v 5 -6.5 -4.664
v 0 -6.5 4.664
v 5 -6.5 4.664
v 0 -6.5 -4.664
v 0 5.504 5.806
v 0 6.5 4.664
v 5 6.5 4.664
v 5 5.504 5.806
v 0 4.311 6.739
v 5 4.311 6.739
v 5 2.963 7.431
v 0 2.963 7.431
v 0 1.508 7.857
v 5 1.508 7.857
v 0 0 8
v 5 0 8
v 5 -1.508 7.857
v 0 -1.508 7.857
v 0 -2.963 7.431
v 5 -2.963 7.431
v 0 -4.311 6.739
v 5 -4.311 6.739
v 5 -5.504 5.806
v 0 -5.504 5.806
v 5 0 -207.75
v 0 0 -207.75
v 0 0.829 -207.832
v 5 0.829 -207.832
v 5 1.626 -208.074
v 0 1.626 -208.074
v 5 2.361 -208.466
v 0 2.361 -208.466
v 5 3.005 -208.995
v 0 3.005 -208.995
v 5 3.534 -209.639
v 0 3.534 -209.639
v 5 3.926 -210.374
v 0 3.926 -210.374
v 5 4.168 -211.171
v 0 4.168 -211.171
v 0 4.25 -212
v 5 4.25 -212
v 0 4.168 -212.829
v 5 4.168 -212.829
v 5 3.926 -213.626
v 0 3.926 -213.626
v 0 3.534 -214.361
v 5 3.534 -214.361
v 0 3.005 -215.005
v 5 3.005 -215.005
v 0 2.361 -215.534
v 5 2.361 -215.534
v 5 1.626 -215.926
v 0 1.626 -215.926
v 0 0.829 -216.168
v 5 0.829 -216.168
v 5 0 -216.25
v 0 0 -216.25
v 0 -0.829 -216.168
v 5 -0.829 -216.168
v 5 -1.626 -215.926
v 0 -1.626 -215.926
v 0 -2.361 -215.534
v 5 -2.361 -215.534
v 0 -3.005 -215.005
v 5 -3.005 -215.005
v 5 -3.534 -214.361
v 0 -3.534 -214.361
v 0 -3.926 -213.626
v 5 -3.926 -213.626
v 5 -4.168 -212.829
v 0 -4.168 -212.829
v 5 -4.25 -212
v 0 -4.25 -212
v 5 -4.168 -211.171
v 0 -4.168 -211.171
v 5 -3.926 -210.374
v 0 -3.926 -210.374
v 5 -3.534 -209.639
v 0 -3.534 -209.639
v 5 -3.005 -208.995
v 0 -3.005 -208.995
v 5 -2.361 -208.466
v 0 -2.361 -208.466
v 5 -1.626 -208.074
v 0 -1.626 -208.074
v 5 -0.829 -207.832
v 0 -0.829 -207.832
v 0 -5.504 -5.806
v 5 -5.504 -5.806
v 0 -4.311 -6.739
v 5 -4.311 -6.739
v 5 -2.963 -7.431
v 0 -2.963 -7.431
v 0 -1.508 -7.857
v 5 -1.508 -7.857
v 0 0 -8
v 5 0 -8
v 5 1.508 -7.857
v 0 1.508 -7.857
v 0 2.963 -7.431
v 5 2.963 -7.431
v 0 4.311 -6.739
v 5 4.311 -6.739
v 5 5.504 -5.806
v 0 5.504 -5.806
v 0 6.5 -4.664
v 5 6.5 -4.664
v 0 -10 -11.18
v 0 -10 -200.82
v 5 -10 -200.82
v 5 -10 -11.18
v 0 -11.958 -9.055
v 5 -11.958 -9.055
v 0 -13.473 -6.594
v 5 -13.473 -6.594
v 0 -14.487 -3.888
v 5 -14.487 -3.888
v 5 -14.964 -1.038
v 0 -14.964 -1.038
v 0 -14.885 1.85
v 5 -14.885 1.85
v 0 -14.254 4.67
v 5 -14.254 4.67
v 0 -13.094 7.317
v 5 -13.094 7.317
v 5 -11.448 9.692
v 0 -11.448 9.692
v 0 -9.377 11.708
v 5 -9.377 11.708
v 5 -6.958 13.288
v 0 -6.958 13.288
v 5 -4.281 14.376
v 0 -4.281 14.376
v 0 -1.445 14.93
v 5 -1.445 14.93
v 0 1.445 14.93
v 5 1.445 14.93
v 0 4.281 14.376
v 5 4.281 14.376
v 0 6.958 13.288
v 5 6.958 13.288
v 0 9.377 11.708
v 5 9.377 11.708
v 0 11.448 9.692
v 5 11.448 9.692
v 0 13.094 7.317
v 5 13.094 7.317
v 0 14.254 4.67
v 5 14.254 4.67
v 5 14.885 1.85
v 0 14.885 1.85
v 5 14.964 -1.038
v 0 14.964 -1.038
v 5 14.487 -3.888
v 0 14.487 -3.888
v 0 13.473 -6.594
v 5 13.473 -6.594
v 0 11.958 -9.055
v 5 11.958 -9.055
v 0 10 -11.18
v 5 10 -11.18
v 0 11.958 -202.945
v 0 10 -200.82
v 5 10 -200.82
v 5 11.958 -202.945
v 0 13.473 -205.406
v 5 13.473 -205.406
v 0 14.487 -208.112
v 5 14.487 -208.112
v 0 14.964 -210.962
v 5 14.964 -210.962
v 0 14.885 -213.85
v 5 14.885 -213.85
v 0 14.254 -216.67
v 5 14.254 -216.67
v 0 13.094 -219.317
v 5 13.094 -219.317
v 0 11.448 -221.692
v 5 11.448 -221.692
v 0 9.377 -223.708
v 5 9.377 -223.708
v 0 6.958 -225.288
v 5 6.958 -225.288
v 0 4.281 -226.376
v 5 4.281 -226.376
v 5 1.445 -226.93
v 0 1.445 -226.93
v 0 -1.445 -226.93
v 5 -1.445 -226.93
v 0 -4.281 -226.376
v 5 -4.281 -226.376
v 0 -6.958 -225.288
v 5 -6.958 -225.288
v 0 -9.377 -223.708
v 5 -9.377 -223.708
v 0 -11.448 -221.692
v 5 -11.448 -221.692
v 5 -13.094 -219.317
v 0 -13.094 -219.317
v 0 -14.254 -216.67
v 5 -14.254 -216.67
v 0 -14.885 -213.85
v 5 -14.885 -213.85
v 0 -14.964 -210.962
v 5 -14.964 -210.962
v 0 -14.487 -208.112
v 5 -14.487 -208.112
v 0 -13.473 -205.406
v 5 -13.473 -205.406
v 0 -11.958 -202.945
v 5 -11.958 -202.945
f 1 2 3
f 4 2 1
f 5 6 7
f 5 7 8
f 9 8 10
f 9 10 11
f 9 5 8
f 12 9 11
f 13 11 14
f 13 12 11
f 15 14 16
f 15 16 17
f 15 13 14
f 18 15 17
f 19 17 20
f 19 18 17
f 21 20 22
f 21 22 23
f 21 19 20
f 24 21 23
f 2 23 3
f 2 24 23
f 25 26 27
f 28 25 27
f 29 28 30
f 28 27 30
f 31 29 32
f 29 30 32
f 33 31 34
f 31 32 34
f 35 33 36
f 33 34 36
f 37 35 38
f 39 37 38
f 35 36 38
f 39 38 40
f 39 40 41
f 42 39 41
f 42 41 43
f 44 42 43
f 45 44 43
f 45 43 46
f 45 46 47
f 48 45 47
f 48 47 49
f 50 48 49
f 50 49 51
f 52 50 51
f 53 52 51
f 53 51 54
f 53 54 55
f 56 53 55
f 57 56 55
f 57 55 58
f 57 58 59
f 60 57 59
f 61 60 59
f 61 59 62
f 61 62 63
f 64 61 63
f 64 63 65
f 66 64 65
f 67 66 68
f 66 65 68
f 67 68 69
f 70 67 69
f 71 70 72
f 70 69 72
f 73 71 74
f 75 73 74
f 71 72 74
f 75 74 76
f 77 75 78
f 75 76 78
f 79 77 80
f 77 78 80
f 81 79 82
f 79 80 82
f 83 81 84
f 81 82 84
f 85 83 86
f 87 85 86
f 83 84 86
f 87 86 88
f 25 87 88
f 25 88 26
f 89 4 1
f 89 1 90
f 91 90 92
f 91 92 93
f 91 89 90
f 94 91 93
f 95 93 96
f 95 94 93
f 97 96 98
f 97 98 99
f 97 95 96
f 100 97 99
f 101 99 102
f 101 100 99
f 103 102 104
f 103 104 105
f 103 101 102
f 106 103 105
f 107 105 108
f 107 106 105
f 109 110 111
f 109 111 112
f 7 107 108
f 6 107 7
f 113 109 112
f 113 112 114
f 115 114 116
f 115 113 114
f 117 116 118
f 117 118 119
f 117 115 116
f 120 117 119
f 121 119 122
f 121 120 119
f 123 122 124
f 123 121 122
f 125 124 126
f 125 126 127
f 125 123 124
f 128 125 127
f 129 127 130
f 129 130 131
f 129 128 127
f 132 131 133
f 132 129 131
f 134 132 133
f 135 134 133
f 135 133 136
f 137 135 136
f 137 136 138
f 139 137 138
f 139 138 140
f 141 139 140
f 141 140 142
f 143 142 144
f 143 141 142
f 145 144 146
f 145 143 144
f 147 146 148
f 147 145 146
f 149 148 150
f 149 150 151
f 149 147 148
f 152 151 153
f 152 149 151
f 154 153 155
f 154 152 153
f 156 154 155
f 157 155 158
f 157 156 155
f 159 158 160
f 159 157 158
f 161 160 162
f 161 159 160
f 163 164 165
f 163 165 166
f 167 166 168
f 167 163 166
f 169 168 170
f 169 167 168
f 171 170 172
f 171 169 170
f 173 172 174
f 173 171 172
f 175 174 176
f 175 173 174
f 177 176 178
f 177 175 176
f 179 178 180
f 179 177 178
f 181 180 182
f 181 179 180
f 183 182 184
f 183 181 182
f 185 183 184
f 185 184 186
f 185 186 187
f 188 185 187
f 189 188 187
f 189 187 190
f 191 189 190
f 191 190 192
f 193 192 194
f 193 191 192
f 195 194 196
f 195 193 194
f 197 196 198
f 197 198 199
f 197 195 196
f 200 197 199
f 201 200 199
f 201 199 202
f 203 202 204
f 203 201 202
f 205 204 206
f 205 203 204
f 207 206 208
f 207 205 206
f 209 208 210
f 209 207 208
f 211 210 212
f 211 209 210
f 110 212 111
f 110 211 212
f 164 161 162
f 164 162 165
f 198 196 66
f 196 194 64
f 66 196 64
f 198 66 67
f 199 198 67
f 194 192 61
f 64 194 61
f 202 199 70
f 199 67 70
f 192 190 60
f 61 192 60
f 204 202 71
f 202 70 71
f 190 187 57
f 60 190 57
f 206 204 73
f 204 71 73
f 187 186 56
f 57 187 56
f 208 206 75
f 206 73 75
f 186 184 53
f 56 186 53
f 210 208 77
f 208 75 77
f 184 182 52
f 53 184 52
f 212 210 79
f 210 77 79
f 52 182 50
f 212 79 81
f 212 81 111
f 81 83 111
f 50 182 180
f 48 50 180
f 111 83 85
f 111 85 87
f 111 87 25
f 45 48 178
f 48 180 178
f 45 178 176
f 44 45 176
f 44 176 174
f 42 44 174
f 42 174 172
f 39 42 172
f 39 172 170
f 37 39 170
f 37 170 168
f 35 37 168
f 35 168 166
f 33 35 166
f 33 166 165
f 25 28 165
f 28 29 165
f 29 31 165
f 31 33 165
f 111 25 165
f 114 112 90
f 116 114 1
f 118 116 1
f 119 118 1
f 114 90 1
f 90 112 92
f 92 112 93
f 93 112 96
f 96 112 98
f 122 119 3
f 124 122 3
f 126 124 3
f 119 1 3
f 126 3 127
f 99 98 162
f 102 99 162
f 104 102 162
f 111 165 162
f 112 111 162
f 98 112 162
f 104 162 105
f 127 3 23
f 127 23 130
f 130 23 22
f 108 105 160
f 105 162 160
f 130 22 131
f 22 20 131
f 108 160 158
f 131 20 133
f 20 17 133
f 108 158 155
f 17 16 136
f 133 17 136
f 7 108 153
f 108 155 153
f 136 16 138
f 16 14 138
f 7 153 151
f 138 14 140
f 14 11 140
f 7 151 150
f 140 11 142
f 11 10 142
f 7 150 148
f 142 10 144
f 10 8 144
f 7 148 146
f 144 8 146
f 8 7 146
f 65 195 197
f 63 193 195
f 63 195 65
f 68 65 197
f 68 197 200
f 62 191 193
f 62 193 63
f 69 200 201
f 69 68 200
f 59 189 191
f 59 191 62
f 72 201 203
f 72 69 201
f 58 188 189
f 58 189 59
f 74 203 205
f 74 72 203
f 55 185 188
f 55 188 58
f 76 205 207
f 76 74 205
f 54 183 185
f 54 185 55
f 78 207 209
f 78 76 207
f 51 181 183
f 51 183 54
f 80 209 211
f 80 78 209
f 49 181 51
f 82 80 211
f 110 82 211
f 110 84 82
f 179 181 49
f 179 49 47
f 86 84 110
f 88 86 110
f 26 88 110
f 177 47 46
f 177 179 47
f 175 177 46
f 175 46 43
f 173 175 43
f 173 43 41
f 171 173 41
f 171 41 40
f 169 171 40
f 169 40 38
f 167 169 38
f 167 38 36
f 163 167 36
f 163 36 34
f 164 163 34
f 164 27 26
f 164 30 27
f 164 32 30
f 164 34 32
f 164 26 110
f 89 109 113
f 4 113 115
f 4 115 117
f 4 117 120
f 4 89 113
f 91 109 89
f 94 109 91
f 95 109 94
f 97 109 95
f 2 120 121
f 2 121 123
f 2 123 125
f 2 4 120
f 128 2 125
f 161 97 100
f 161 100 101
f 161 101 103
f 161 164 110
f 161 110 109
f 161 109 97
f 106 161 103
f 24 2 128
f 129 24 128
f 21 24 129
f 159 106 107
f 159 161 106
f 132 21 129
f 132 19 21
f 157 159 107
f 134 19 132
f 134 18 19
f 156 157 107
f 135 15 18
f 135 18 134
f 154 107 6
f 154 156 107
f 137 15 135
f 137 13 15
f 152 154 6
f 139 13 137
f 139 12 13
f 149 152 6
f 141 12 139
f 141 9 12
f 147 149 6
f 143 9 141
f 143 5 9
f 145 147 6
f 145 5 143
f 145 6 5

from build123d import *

# Parameters (mm, degrees)
BOSS_EXTRU_1_DEPTH = 5
TROU_TARAUD_M101_D = 8.5


with BuildPart() as part:
    # Esquisse1 → Boss.-Extru.1 (new body)
    with BuildSketch(Plane(origin=(0, 0, 0), x_dir=(0, 0, -1), z_dir=(1, 0, 0))):
        with BuildLine():
            Line((11.180339887, 10), (200.819660113, 10))
            ThreePointArc((200.819660113, 10), (227, 0), (200.819660113, -10))
            Line((200.819660113, -10), (11.180339887, -10))
            ThreePointArc((11.180339887, -10), (-15, 0), (11.180339887, 10))
        make_face()
        with BuildLine():
            Line((-4.663689527, -6.5), (4.663689527, -6.5))
            ThreePointArc((4.663689527, -6.5), (8, 0), (4.663689527, 6.5))
            Line((4.663689527, 6.5), (-4.663689527, 6.5))
            ThreePointArc((-4.663689527, 6.5), (-8, 0), (-4.663689527, -6.5))
        make_face(mode=Mode.SUBTRACT)
    extrude(amount=BOSS_EXTRU_1_DEPTH)

    # Trou taraudé M101 (through all)
    with Locations(Plane(origin=(5, 0, 0), x_dir=(0, 0, -1), z_dir=(1, 0, 0))):
        with Locations((212, 0)):
            Hole(TROU_TARAUD_M101_D / 2)


solid = part.part
